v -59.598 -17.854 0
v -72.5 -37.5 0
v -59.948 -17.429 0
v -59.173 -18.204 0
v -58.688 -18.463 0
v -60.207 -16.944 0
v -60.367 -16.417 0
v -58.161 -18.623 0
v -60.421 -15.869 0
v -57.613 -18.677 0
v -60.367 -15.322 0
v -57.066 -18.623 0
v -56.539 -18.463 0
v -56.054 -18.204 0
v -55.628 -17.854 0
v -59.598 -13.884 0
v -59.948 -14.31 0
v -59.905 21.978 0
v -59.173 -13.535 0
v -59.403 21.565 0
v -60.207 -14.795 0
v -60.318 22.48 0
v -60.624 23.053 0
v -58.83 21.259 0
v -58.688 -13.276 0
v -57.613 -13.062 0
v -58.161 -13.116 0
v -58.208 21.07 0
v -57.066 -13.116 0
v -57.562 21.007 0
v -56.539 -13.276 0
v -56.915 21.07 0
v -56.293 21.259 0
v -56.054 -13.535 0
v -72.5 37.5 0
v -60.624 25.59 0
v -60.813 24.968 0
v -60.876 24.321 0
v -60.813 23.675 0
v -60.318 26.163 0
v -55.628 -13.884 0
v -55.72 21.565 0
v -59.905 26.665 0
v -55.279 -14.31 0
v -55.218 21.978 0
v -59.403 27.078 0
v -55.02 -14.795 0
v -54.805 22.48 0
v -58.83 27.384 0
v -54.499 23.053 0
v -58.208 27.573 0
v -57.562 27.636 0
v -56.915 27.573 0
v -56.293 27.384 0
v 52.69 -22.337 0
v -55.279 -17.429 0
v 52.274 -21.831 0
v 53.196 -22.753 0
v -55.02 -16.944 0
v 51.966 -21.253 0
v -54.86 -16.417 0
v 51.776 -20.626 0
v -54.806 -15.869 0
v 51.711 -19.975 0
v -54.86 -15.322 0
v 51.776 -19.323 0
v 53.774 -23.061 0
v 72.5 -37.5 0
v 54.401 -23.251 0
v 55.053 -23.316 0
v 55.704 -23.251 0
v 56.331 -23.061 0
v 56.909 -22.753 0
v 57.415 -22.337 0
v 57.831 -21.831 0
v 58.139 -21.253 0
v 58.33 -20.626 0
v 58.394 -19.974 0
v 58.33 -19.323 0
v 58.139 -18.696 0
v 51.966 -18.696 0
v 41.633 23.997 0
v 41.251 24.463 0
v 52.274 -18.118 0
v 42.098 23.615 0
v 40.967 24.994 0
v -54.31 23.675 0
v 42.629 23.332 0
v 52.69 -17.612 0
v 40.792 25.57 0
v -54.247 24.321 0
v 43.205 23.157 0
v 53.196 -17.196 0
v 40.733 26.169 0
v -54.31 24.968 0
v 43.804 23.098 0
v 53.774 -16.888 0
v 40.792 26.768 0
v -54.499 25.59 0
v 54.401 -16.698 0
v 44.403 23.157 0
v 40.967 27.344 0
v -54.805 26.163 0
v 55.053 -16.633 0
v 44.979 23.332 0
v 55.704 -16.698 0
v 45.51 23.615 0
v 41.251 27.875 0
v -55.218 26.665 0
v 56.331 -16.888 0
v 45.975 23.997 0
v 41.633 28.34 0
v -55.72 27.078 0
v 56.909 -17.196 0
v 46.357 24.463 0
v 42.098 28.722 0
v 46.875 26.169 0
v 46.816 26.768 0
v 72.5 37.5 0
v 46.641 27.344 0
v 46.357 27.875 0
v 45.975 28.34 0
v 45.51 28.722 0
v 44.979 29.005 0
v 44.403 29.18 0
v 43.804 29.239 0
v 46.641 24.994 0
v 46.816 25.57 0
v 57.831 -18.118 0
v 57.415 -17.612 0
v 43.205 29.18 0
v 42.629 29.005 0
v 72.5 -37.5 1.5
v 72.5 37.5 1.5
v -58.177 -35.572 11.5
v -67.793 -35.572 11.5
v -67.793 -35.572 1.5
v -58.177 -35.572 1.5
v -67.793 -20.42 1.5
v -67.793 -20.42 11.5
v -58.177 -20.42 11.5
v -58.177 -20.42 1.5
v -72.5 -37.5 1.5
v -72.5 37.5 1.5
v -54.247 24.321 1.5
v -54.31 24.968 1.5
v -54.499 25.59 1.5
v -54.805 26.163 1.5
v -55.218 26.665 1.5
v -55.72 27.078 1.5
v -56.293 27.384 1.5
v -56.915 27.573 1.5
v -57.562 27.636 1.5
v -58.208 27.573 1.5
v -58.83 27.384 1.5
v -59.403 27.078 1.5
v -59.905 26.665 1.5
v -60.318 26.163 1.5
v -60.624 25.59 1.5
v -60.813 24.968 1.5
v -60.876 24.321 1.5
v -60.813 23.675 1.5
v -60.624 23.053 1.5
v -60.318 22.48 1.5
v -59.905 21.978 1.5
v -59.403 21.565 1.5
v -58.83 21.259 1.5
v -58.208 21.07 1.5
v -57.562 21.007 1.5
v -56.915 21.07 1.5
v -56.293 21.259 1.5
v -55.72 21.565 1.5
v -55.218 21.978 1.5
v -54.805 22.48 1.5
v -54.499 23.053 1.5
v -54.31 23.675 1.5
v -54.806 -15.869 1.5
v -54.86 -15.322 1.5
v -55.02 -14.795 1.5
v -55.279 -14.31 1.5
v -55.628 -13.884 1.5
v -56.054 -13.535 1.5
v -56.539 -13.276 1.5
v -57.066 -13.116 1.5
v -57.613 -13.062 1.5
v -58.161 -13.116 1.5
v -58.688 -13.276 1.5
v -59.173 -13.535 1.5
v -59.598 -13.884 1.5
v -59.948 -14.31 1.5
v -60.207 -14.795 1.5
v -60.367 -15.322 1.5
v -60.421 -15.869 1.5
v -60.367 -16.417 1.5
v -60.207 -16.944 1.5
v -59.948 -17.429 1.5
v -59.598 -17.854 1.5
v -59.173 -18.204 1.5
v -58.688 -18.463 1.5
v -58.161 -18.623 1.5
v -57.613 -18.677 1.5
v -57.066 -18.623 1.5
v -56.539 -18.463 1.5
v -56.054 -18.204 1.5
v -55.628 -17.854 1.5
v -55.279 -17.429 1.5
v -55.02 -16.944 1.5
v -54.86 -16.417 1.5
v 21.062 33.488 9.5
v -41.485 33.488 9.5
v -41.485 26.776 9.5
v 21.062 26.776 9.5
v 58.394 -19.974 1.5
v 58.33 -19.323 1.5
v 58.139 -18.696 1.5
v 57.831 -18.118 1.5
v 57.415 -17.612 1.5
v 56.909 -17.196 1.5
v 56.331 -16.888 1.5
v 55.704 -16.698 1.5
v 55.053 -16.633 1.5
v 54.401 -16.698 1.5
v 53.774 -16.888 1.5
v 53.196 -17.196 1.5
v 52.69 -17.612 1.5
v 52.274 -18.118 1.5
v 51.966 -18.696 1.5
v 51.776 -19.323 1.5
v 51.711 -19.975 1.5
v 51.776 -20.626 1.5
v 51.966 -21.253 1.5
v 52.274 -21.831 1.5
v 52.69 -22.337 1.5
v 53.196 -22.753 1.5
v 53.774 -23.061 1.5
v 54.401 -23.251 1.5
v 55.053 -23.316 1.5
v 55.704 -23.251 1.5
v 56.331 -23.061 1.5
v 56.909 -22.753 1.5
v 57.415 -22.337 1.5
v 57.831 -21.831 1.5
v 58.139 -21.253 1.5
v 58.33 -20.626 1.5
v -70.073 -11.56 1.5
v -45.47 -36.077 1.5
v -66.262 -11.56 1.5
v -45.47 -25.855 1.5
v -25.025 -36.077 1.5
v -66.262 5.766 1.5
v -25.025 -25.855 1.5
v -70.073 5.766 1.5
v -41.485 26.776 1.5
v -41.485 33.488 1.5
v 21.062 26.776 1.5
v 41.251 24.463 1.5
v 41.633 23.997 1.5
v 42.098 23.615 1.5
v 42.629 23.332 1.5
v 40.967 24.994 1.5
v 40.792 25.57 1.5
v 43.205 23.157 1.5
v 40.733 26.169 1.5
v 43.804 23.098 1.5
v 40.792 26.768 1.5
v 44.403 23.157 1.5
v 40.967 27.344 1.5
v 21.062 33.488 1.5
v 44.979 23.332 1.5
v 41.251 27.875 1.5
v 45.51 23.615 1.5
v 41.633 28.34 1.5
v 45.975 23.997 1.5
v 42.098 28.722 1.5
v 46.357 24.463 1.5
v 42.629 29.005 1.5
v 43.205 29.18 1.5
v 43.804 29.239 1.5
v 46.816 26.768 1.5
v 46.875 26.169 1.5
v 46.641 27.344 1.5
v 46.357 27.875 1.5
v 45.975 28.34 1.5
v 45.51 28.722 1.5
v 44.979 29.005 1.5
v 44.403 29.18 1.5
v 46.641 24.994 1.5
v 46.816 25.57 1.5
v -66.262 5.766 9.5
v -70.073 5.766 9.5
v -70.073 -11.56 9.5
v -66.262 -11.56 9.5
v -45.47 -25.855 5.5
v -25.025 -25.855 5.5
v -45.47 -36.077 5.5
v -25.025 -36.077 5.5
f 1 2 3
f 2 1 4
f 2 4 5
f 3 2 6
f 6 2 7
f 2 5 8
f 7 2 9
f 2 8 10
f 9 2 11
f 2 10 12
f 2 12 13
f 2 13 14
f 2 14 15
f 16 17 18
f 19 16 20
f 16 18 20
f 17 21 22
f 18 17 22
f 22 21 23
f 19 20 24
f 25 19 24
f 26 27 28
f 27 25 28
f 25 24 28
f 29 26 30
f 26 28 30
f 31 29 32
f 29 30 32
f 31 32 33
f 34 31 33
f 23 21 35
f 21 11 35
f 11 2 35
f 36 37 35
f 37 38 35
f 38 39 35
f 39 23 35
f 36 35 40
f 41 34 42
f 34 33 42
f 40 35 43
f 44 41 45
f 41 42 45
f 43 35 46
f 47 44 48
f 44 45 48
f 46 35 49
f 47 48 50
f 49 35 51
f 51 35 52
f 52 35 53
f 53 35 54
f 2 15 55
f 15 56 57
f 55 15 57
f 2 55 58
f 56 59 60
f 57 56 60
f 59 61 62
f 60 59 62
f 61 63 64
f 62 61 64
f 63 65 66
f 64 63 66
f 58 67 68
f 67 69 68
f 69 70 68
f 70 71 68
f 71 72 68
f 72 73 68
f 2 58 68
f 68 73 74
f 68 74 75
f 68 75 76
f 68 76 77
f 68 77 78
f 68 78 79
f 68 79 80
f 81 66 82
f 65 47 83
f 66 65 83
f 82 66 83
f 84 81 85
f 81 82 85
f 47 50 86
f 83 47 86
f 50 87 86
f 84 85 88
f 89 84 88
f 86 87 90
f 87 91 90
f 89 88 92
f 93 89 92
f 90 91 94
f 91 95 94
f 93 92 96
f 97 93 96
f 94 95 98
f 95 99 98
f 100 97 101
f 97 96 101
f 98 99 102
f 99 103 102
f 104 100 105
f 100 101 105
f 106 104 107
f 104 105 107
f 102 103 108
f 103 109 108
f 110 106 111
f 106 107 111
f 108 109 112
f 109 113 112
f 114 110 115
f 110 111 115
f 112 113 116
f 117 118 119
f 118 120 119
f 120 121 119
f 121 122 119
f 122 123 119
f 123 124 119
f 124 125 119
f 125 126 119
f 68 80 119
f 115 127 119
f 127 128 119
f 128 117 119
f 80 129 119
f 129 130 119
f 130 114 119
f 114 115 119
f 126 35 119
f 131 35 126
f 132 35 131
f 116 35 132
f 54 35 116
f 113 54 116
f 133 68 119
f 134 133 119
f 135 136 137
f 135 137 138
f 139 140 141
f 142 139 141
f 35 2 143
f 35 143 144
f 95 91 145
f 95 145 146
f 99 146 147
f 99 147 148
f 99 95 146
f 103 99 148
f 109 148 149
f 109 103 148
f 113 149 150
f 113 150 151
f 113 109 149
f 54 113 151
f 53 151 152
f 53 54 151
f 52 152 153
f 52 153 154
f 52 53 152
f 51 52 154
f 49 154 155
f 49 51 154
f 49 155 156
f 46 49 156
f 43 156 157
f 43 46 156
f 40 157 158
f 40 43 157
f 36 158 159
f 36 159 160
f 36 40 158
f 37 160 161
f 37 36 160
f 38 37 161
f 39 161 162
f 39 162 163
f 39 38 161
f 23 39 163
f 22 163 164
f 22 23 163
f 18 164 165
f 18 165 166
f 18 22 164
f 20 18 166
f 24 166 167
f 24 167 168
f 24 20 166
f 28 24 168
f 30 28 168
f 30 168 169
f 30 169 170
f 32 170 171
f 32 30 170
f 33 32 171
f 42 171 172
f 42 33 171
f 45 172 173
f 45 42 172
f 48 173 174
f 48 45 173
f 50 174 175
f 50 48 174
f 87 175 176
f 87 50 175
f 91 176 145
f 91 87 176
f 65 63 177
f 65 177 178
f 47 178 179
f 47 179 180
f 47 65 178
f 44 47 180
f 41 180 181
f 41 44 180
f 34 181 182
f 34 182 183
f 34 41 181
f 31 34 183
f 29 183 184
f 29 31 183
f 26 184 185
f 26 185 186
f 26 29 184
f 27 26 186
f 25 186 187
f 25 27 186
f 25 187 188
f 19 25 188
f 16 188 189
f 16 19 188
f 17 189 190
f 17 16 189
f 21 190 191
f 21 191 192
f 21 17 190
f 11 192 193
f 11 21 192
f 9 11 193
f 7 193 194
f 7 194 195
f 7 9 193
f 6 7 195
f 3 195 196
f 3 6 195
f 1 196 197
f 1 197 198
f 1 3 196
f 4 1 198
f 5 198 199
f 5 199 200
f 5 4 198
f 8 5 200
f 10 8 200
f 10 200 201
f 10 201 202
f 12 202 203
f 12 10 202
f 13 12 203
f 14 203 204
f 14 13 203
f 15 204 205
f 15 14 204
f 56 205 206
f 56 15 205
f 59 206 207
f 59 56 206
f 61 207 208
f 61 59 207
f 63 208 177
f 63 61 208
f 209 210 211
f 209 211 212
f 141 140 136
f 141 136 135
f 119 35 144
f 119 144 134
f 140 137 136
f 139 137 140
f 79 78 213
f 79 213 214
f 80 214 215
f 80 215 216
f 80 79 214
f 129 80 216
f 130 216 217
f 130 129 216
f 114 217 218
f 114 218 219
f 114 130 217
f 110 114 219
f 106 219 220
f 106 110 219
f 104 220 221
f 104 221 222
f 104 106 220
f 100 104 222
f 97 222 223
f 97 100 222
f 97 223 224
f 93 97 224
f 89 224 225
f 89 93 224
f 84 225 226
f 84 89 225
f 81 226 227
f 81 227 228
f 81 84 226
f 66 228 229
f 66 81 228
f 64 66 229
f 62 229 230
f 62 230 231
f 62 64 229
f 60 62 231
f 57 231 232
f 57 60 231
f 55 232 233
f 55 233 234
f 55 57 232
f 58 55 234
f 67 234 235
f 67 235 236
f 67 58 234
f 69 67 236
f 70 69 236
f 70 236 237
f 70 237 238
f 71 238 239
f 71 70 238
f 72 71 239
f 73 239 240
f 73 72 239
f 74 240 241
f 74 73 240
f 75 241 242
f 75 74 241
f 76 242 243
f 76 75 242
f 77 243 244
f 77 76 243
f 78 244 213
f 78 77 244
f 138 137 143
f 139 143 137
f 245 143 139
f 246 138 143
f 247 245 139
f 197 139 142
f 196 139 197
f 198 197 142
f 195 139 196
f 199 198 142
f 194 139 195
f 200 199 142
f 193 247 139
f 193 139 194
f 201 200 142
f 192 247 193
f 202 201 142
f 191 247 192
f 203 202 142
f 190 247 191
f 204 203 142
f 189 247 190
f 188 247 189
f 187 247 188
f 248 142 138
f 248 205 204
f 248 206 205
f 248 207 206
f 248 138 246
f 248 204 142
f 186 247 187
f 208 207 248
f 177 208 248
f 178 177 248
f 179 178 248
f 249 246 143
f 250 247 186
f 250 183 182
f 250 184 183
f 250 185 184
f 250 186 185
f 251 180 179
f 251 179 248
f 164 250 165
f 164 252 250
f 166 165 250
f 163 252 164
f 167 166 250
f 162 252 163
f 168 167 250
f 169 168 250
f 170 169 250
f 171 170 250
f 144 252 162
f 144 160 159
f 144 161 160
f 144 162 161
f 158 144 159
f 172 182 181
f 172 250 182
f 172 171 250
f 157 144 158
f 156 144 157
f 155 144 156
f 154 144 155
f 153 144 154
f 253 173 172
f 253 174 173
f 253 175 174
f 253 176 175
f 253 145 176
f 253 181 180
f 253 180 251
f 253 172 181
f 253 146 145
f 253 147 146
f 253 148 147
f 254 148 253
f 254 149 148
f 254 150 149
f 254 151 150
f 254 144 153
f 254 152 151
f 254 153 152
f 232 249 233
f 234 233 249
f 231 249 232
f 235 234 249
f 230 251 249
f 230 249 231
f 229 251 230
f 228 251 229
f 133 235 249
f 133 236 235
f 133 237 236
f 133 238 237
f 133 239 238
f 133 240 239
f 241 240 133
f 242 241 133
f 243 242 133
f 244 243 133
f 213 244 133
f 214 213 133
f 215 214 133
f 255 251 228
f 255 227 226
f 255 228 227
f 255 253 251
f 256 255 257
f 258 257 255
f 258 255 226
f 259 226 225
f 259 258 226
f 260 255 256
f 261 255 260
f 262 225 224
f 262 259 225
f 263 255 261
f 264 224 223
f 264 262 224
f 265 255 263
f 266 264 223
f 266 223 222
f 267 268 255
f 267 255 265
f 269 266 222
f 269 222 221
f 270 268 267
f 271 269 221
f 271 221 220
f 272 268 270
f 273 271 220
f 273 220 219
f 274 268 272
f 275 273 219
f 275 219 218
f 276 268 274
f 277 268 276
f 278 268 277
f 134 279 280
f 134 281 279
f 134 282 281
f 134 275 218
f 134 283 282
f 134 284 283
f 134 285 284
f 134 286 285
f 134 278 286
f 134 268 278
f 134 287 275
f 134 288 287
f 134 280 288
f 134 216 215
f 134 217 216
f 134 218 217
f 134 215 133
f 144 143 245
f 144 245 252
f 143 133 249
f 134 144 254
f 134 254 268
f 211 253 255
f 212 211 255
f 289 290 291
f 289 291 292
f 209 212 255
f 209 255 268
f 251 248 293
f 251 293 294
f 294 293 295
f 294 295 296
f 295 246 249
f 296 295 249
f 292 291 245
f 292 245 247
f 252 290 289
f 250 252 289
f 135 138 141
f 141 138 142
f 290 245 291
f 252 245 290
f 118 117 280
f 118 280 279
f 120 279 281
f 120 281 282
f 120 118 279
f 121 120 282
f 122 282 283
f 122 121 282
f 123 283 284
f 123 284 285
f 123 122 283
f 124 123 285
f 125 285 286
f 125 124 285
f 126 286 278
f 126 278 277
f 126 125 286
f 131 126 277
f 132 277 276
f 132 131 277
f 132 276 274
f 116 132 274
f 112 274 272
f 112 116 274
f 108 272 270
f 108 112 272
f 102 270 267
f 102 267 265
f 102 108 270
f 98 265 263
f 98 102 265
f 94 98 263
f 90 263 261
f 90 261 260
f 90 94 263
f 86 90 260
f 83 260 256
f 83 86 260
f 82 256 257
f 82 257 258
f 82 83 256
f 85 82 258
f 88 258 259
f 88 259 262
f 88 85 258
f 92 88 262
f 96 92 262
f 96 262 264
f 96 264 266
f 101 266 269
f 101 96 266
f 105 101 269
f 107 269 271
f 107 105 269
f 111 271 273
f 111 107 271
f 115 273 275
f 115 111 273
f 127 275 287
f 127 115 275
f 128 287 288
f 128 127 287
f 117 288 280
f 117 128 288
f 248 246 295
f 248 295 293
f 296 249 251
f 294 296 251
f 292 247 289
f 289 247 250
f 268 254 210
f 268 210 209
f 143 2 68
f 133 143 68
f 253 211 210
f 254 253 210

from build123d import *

# Parameters (mm, degrees)
F0_W     = 145
F0_H     = 75
F0_R     = 2.807313
F0_R_2   = 3.341189
F0_R_3   = 3.314808
F0_R_4   = 3.070611
F1_DEPTH = 1.5
F2_W     = 20.444891
F2_H     = 10.22245
F3_DEPTH = 4
F2_W_2   = 3.811762
F2_H_2   = 17.326181
F2_W_3   = 62.547514
F2_H_3   = 6.711255
F4_DEPTH = 8
F2_W_4   = 9.615884
F2_H_4   = 15.152305
F5_DEPTH = 10


with BuildPart() as f1:
    # F0 (on Top) → F1 (new body)
    with BuildSketch(Plane.XY):
        Rectangle(F0_W, F0_H)
        with Locations((-57.613384, -15.869359)):
            Circle(F0_R, mode=Mode.SUBTRACT)
        with Locations((55.052515, -19.9745)):
            Circle(F0_R_2, mode=Mode.SUBTRACT)
        with Locations((-57.561513, 24.321459)):
            Circle(F0_R_3, mode=Mode.SUBTRACT)
        with Locations((43.803934, 26.168576)):
            Circle(F0_R_4, mode=Mode.SUBTRACT)
    extrude(amount=F1_DEPTH)

    # F2 (on face) → F3 (join)
    with BuildSketch(Plane.XY.offset(1.5)):
        with Locations((-35.247806, -30.96582)):
            Rectangle(F2_W, F2_H)
    extrude(amount=F3_DEPTH)

    # F2 (on face) → F4 (join)
    with BuildSketch(Plane.XY.offset(1.5)):
        with Locations((-68.167552, -2.897407)):
            Rectangle(F2_W_2, F2_H_2)
        with Locations((-10.211478, 30.131946)):
            Rectangle(F2_W_3, F2_H_3)
    extrude(amount=F4_DEPTH)

    # F2 (on face) → F5 (join)
    with BuildSketch(Plane.XY.offset(1.5)):
        with Locations((-62.984608, -27.995717)):
            Rectangle(F2_W_4, F2_H_4)
    extrude(amount=F5_DEPTH)


solid = f1.part
